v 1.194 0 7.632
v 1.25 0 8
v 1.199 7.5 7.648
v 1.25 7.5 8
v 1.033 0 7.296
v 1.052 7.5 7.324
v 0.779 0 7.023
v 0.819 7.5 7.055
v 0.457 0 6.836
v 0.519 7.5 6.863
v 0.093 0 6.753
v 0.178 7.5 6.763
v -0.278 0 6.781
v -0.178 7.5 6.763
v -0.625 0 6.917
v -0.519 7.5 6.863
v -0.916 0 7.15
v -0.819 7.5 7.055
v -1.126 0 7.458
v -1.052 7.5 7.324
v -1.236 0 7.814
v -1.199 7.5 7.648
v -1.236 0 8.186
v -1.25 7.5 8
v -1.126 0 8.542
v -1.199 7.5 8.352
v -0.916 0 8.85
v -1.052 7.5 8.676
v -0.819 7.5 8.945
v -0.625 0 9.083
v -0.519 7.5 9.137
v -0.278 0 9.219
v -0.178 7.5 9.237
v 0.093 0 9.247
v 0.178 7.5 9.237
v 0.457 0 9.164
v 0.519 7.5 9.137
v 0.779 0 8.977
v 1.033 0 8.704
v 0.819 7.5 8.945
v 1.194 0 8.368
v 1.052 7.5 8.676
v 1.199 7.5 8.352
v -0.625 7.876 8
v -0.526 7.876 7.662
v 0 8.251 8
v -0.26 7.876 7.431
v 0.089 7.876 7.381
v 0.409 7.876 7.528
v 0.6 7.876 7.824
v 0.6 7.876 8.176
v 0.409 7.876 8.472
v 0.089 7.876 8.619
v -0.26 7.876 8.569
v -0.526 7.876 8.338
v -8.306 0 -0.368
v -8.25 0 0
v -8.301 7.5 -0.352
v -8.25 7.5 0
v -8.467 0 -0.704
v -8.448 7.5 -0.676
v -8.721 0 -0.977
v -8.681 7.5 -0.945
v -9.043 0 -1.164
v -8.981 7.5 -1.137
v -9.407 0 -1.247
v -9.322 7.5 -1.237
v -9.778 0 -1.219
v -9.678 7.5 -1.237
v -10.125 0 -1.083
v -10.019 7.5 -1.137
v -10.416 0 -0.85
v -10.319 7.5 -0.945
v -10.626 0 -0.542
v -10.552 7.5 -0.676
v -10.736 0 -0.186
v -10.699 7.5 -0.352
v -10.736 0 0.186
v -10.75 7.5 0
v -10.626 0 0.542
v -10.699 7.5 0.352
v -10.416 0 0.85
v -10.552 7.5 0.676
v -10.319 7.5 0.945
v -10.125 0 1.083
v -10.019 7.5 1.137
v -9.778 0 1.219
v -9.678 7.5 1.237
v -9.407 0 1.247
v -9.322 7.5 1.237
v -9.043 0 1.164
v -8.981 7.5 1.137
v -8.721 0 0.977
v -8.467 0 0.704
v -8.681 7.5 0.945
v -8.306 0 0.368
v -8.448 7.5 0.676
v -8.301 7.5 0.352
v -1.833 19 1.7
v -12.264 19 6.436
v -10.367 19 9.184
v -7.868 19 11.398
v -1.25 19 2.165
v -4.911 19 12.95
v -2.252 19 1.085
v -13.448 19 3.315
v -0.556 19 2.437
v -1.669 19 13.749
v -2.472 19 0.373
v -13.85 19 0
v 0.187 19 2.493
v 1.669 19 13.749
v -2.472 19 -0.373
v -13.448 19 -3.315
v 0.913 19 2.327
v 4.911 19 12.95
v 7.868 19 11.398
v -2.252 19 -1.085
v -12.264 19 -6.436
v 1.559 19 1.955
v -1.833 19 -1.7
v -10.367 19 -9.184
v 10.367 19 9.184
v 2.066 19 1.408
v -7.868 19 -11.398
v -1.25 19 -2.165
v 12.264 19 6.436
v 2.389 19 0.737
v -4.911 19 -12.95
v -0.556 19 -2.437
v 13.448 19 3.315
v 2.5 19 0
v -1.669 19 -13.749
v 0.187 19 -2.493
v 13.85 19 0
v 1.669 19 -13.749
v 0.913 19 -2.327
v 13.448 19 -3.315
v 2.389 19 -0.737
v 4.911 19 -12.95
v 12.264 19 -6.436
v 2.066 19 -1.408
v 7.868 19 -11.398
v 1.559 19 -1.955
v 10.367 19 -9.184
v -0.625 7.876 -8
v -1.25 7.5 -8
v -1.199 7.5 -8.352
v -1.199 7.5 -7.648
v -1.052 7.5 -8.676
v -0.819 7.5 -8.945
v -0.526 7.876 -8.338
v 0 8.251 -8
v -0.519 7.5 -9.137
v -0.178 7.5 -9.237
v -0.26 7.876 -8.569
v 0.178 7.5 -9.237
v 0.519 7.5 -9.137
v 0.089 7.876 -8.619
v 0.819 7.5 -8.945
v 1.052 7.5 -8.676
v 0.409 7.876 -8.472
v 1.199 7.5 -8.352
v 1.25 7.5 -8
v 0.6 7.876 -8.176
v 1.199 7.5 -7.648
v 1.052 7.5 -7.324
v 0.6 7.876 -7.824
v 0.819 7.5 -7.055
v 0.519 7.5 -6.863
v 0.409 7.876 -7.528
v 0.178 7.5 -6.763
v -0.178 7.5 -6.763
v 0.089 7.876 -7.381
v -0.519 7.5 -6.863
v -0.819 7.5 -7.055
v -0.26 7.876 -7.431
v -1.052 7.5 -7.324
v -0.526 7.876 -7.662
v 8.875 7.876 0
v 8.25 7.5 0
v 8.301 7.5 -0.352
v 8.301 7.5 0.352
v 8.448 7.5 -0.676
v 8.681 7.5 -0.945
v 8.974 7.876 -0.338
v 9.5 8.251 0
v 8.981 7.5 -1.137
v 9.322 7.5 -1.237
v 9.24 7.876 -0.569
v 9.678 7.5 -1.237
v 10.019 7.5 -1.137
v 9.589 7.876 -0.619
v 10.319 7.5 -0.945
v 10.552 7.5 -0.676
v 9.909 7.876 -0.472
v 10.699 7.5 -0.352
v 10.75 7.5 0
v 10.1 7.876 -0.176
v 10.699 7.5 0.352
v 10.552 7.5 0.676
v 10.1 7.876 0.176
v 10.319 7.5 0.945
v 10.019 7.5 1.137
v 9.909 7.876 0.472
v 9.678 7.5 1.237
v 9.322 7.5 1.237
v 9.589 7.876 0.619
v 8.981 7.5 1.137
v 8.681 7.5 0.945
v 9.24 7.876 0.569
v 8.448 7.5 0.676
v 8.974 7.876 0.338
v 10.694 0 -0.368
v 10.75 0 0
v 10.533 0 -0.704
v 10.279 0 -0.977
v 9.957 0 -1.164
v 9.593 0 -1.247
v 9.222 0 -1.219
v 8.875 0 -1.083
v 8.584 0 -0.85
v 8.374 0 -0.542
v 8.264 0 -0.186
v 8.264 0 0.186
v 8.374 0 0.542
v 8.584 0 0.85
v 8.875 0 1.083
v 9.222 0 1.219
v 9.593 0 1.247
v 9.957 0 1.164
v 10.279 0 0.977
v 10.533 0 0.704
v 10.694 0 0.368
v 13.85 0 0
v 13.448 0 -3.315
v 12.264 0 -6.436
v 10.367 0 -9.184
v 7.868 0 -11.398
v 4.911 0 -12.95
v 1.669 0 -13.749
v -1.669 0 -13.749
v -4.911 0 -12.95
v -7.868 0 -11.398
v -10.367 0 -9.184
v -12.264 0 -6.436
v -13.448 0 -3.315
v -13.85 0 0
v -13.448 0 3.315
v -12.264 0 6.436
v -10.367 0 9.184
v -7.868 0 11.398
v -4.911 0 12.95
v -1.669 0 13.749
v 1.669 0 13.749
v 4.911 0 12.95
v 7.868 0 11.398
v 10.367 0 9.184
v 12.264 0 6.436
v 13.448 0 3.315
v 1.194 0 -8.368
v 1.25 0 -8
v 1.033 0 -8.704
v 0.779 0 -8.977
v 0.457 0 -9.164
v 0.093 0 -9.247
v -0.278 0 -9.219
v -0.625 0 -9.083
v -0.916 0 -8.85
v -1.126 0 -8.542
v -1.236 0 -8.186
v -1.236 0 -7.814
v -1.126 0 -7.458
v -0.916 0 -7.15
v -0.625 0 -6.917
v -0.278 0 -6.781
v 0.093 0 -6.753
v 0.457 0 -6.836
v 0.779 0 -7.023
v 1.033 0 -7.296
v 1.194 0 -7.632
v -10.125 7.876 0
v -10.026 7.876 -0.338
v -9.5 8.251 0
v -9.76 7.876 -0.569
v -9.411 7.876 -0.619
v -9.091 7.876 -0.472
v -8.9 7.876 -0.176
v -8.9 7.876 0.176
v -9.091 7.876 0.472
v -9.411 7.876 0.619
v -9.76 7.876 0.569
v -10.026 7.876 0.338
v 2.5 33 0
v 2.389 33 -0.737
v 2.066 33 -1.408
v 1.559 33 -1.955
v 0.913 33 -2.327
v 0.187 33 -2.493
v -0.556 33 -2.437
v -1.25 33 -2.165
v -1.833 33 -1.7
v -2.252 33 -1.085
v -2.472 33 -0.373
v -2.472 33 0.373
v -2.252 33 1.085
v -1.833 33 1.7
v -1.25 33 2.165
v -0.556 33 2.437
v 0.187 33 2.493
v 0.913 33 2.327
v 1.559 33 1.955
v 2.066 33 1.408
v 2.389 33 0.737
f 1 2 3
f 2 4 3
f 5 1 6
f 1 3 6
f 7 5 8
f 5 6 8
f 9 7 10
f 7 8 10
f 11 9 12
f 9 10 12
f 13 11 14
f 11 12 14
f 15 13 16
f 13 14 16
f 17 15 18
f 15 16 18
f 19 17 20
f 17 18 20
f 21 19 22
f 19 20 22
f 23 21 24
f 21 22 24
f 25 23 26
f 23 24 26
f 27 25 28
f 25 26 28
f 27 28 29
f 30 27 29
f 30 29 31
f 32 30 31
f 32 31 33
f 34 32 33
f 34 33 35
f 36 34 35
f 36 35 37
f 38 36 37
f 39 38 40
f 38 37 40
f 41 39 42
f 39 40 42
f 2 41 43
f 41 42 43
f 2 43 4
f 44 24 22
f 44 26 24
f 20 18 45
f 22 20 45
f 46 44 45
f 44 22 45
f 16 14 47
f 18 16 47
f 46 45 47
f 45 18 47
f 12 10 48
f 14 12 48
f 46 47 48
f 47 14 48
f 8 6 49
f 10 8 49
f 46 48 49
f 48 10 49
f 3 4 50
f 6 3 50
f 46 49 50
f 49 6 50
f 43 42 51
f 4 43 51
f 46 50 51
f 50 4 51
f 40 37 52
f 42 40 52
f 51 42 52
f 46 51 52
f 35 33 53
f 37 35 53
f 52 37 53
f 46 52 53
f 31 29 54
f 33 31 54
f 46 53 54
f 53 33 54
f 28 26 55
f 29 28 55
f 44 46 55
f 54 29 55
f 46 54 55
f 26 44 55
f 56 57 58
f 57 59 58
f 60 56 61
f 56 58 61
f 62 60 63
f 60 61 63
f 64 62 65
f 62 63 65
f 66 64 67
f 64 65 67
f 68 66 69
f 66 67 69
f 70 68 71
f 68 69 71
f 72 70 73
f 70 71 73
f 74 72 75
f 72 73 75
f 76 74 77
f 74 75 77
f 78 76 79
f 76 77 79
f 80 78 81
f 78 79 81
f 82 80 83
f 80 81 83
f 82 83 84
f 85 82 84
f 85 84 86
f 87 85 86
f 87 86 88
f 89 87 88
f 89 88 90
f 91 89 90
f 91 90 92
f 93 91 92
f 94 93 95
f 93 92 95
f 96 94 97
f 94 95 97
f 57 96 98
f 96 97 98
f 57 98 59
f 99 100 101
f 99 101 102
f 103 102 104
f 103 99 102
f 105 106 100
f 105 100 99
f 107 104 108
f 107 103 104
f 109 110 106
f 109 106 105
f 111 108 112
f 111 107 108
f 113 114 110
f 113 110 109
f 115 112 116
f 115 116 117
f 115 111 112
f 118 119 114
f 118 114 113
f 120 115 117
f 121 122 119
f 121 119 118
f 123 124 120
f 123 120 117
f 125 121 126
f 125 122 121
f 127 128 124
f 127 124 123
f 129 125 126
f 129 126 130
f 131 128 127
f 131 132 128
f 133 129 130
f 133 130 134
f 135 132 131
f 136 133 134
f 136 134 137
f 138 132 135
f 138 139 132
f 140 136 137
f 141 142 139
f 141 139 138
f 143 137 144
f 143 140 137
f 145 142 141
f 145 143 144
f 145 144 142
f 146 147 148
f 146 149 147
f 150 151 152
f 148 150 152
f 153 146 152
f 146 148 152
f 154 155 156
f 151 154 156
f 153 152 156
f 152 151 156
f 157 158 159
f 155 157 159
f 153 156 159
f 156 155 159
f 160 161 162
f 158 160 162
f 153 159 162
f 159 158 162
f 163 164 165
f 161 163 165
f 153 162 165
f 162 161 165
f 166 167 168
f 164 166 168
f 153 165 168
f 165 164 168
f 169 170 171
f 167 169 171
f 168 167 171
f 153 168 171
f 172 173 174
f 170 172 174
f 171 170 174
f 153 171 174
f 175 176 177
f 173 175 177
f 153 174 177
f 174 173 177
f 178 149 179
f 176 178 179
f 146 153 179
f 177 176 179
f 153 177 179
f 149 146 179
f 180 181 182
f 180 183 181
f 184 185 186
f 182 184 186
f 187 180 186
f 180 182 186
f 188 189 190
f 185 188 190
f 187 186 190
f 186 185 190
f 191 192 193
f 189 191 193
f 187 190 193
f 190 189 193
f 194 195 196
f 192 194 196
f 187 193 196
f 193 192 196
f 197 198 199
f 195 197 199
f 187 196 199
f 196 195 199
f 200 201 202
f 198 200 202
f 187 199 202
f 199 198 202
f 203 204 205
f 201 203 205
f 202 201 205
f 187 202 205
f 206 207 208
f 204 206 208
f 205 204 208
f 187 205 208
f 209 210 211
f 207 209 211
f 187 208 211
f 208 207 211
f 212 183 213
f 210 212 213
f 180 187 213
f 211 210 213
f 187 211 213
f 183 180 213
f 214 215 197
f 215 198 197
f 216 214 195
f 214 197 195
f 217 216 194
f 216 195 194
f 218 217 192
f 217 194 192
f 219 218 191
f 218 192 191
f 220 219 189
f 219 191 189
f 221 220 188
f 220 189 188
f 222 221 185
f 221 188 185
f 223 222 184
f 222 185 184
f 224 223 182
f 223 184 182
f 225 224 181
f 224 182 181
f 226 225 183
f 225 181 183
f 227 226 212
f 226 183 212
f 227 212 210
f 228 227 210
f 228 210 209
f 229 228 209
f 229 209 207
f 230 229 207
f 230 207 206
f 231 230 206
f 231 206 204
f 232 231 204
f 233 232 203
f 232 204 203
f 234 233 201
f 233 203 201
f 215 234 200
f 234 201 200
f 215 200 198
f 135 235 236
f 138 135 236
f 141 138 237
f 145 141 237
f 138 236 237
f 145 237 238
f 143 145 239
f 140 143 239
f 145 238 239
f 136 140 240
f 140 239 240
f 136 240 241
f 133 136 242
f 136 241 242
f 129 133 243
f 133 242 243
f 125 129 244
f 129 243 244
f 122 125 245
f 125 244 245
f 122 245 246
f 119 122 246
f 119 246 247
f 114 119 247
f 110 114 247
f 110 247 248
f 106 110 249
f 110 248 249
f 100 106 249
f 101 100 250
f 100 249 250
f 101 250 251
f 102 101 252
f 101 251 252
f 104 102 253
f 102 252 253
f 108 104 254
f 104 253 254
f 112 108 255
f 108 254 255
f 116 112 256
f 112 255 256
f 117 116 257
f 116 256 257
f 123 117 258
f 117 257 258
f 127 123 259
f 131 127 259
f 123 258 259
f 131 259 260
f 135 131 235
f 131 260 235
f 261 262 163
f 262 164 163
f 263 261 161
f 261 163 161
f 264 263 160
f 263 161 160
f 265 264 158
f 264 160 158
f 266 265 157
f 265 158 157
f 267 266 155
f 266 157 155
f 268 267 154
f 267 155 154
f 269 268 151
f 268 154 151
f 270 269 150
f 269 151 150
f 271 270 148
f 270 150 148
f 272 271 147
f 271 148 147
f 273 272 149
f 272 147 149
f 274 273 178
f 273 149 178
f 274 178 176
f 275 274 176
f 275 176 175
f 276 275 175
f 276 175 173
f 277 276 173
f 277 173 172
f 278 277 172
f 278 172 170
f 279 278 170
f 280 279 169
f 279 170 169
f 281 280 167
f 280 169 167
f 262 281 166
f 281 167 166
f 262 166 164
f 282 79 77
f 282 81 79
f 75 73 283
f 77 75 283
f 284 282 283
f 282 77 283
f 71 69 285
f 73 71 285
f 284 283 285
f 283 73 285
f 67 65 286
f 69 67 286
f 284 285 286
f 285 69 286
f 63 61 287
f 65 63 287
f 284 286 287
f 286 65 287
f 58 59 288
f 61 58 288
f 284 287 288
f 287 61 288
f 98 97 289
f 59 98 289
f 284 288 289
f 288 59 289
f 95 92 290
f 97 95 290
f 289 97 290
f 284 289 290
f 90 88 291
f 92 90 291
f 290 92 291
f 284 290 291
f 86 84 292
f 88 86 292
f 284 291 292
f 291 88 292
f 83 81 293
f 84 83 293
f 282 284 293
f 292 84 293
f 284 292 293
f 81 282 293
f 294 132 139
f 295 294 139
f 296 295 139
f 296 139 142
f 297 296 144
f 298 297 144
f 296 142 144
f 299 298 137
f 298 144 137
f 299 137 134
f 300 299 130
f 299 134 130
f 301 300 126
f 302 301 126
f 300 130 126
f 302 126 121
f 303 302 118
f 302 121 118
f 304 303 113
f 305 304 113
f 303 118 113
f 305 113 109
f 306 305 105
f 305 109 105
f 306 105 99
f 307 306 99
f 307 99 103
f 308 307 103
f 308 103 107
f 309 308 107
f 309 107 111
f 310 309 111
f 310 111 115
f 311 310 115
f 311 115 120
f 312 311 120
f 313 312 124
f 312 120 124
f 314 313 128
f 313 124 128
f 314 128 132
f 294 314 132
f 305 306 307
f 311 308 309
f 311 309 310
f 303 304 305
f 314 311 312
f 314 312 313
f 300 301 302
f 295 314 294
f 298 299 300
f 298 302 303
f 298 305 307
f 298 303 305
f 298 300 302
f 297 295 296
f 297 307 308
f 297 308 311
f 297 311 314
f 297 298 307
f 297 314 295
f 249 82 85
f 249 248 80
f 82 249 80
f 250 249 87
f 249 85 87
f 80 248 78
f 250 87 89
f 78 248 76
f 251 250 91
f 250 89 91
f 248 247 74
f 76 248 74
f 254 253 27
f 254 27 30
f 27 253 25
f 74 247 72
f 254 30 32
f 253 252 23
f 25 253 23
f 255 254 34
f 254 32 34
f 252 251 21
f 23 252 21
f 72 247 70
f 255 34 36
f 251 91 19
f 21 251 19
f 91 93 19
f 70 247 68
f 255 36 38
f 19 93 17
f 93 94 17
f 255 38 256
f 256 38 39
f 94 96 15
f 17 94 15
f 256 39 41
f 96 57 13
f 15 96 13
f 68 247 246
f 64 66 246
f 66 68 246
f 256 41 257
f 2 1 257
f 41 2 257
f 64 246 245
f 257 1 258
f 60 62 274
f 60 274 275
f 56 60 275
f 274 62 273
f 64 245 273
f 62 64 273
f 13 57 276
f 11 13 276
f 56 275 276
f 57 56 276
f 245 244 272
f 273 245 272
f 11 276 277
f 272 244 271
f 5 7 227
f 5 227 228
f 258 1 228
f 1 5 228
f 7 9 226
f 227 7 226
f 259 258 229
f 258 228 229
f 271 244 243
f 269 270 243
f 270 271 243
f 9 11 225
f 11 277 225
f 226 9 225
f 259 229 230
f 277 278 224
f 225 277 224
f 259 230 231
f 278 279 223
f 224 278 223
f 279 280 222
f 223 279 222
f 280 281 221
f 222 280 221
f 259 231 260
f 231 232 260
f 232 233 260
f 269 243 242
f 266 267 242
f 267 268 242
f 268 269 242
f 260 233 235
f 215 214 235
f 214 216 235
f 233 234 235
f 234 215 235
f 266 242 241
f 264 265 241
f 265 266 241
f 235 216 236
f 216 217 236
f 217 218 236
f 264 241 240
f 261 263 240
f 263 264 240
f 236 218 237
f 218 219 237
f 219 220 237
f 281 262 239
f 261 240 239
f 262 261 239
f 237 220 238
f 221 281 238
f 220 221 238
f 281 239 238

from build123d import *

# Parameters (mm, degrees)
SKETCH1_R                 = 13.85
BOSS_EXTRUDE1_DEPTH       = 19
SKETCH2_R                 = 2.5
BOSS_EXTRUDE2_DEPTH       = 14
M3X0_5_TAPPED_HOLE1_D     = 2.5
M3X0_5_TAPPED_HOLE1_DEPTH = 7.5
M3X0_5_TAPPED_HOLE1_TIP   = 0.751075774


with BuildPart() as part:
    # Sketch1 → Boss-Extrude1 (new body)
    with BuildSketch(Plane(origin=(0, 0, 0), x_dir=(1, 0, 0), z_dir=(0, 1, 0))):
        Circle(SKETCH1_R)
    extrude(amount=BOSS_EXTRUDE1_DEPTH)

    # Sketch2 → Boss-Extrude2 (add)
    with BuildSketch(Plane(origin=(0, 19, 0), x_dir=(1, 0, 0), z_dir=(0, 1, 0))):
        Circle(SKETCH2_R)
    extrude(amount=BOSS_EXTRUDE2_DEPTH)

    # M3x0.5 Tapped Hole1
    with Locations(Plane(origin=(0, 0, 0), x_dir=(-1, 0, 0), z_dir=(0, -1, 0))):
        with Locations((0, -8), (9.5, 0), (0, 8), (-9.5, 0)):
            Hole(M3X0_5_TAPPED_HOLE1_D / 2, depth=M3X0_5_TAPPED_HOLE1_DEPTH)
            with Locations((0, 0, -(M3X0_5_TAPPED_HOLE1_DEPTH + M3X0_5_TAPPED_HOLE1_TIP / 2))):  # 118° drill point
                Cone(0, M3X0_5_TAPPED_HOLE1_D / 2, M3X0_5_TAPPED_HOLE1_TIP, mode=Mode.SUBTRACT)


solid = part.part
